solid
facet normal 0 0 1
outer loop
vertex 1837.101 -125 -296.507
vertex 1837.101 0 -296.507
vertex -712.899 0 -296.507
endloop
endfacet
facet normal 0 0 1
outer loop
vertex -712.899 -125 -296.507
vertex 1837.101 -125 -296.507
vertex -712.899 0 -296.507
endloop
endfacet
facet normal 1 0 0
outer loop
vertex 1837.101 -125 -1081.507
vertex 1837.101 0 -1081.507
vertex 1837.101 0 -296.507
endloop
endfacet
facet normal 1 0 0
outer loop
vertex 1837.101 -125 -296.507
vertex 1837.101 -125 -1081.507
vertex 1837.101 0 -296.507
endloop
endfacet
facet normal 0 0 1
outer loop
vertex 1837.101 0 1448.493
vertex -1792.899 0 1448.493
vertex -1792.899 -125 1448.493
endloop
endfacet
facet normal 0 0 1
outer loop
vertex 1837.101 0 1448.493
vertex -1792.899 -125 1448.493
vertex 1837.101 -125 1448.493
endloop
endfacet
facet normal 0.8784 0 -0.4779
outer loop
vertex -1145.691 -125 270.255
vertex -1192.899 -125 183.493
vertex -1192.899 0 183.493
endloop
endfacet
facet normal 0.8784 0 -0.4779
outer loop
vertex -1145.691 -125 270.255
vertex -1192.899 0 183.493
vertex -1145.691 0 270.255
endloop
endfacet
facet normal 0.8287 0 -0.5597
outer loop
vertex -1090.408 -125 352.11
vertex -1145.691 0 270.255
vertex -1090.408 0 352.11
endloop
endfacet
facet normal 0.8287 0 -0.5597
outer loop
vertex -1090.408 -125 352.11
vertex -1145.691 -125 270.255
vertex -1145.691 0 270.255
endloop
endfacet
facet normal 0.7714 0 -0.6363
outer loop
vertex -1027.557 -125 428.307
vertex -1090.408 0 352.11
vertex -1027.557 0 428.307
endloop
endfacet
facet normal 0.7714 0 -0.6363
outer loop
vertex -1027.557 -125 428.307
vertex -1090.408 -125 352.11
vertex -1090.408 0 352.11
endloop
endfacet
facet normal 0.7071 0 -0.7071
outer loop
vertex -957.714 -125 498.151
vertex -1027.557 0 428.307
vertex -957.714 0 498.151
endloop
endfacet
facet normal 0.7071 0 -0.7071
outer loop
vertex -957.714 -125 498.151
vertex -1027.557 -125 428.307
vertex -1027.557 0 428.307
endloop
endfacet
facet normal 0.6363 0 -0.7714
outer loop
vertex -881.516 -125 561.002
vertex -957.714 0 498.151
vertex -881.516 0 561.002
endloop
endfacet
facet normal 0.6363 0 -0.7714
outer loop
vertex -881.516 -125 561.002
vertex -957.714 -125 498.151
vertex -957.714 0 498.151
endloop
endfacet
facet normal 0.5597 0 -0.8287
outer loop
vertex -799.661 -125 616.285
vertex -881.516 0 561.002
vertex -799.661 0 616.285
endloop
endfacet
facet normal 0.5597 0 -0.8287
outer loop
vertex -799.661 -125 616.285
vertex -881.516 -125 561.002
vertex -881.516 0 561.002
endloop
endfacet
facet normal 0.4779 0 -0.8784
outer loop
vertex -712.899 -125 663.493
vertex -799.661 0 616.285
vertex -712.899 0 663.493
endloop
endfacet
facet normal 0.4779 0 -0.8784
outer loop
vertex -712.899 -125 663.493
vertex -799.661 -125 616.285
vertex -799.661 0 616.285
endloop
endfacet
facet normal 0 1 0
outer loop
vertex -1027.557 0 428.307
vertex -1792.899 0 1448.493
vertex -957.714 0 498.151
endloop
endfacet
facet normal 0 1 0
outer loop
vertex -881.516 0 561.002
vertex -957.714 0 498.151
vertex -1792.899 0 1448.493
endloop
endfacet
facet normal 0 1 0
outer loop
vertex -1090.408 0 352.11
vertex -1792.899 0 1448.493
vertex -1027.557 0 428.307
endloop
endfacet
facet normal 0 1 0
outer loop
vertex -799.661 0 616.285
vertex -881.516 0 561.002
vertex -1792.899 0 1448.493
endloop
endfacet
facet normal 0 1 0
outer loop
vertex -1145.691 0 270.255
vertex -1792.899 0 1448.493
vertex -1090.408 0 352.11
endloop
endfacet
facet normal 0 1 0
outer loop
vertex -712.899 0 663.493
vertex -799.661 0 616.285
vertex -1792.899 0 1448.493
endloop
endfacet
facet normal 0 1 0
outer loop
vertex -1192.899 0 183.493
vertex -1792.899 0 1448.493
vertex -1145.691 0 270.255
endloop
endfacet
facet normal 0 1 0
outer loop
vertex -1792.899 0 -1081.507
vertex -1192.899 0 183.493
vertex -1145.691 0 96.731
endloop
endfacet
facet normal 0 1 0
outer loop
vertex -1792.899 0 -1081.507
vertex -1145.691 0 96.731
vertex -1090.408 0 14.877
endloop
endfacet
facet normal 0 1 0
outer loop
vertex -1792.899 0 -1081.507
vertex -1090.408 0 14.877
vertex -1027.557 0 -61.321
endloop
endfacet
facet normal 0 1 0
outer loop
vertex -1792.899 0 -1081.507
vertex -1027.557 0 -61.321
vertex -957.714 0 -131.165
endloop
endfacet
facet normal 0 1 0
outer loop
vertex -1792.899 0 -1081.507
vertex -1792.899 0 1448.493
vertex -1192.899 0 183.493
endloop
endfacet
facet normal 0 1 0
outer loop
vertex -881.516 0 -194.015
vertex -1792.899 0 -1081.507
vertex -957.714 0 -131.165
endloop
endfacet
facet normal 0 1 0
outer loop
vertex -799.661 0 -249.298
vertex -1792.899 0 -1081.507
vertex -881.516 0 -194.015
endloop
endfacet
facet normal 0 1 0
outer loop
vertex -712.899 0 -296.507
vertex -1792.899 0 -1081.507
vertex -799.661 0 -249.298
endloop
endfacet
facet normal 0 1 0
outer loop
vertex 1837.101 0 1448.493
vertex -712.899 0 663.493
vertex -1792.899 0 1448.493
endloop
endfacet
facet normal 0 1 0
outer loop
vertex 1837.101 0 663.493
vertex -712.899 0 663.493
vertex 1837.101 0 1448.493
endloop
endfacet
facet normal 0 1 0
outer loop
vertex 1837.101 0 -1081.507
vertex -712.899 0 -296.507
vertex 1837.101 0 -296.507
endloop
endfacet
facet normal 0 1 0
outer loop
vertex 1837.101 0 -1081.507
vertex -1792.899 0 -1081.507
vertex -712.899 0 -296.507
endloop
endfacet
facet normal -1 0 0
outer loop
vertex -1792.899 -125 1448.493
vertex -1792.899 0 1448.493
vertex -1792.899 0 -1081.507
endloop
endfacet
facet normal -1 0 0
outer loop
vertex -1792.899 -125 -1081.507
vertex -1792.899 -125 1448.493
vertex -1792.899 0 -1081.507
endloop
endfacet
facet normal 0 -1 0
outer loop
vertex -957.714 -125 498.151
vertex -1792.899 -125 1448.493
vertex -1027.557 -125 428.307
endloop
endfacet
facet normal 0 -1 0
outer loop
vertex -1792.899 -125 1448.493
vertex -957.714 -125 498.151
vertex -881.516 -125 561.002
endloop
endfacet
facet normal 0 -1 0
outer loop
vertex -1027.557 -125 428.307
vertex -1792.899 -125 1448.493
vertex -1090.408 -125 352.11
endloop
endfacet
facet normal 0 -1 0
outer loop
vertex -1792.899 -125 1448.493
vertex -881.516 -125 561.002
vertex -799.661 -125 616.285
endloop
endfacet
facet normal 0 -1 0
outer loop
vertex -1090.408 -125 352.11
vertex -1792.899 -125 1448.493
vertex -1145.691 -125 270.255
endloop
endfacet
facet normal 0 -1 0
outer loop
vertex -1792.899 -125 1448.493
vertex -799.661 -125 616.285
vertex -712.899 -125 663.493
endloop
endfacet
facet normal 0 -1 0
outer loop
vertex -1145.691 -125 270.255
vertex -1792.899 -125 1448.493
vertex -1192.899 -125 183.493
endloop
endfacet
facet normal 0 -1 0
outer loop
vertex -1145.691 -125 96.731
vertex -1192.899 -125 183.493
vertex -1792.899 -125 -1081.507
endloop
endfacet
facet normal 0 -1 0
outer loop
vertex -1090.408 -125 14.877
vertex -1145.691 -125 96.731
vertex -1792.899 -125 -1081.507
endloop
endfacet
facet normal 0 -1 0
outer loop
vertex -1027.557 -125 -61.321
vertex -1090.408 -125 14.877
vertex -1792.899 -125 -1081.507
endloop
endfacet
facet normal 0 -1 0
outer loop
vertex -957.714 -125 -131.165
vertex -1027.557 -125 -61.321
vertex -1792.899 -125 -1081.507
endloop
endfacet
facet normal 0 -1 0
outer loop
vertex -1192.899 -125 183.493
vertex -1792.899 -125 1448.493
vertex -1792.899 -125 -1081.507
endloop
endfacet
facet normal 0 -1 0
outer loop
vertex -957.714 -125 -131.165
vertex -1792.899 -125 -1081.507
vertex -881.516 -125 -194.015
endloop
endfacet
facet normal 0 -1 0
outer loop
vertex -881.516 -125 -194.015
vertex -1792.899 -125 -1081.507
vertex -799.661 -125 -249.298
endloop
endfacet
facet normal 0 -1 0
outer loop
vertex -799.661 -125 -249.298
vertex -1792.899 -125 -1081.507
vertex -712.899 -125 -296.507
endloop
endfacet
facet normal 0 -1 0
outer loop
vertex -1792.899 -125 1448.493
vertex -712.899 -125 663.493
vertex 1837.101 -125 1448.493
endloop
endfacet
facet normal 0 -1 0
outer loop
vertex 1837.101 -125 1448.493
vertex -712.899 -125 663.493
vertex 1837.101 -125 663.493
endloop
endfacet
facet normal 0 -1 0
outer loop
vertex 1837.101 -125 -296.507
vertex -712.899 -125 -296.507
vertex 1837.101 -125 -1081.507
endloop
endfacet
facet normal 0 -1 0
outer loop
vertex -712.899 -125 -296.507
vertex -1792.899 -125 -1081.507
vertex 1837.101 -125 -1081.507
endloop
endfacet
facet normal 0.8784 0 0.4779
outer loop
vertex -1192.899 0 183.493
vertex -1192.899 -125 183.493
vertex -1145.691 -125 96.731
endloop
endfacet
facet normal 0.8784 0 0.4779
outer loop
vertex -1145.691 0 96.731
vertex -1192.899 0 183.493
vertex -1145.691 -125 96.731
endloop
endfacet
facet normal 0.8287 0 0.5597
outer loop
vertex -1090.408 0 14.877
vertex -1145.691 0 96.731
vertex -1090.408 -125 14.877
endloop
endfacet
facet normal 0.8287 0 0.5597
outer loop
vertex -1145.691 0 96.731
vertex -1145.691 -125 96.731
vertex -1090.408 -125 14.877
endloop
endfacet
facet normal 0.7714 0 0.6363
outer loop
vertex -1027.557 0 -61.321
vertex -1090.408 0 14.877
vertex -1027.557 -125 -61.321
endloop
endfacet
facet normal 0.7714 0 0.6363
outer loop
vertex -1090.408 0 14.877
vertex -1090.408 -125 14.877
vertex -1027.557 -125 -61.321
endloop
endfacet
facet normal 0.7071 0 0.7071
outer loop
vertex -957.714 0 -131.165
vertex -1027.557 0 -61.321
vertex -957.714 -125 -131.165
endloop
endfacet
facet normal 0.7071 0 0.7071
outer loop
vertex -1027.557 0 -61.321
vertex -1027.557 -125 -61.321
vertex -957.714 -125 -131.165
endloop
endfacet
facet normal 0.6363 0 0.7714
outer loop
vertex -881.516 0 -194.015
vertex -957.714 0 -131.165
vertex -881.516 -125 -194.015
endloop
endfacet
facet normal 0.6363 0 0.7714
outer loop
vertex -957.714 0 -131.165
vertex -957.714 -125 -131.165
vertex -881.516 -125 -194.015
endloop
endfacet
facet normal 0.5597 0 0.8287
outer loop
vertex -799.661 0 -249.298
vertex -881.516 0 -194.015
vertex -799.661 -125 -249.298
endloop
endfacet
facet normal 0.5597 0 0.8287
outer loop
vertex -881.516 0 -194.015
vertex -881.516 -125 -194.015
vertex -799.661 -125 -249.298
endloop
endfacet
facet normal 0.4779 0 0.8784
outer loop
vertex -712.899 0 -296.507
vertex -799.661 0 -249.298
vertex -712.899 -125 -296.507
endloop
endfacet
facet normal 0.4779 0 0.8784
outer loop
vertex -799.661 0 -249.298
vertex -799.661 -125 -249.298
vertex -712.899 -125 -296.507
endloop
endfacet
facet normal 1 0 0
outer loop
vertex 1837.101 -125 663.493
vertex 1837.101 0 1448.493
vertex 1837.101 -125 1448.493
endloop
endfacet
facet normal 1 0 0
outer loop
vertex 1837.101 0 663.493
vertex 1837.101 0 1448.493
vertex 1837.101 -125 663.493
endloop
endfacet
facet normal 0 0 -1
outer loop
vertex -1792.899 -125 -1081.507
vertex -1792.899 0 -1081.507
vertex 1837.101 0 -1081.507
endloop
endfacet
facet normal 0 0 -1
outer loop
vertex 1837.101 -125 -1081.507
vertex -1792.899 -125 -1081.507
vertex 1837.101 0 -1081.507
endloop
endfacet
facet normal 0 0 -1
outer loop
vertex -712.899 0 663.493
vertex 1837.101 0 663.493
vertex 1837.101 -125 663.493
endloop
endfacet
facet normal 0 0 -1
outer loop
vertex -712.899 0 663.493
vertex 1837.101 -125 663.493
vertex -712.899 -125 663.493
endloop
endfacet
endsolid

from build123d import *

# Parameters (mm, degrees)
F0_W     = 3630
F0_H     = 1265
F1_DEPTH = 125
F3_DEPTH = 125
F5_DEPTH = 125
F7_DEPTH = 125


with BuildPart() as f1:
    # F0 (on Front) → F1 (new body)
    with BuildSketch(Plane.XZ):
        with Locations((22.100514, -449.006776)):
            Rectangle(F0_W, F0_H)
    extrude(amount=F1_DEPTH)

    # F2 (on face) → F3 (cut, through all)
    with BuildSketch(Plane(origin=(0, 0, 0), x_dir=(-1, 0, 0), z_dir=(0, 1, 0))):
        Polygon((1192.899486, 183.493224), (-1237.100514, 183.493224), (-757.100514, -296.506776), (712.899486, -296.506776), align=None)
    extrude(amount=-F3_DEPTH, mode=Mode.SUBTRACT)

    # F4 (on face) → F5 (cut, through all)
    with BuildSketch(Plane.XZ.offset(125)):
        Polygon((1237.100514, 183.493224), (757.100514, -296.506776), (1837.100514, -296.506776), (1837.100514, 183.493224), align=None)
    extrude(amount=-F5_DEPTH, mode=Mode.SUBTRACT)

    # F6 (on face) → F7 (cut, through all)
    with BuildSketch(Plane.XZ.offset(125)):
        with BuildLine():
            Line((-712.899486, -296.506776), (-1192.899486, 183.493224))
            ThreePointArc((-1192.899486, 183.493224), (-993.471042, -97.078331), (-712.899486, -296.506776))
        make_face()
    extrude(amount=-F7_DEPTH, mode=Mode.SUBTRACT)

    # F8: F1 across face


with BuildPart() as f1_1:
    add(f1.part)
    add(f1.part.mirror(Plane(origin=(-1492.899486, -62.5, 183.493224), x_dir=(1, 0, 0), z_dir=(0, 0, 1))))


solid = f1_1.part
